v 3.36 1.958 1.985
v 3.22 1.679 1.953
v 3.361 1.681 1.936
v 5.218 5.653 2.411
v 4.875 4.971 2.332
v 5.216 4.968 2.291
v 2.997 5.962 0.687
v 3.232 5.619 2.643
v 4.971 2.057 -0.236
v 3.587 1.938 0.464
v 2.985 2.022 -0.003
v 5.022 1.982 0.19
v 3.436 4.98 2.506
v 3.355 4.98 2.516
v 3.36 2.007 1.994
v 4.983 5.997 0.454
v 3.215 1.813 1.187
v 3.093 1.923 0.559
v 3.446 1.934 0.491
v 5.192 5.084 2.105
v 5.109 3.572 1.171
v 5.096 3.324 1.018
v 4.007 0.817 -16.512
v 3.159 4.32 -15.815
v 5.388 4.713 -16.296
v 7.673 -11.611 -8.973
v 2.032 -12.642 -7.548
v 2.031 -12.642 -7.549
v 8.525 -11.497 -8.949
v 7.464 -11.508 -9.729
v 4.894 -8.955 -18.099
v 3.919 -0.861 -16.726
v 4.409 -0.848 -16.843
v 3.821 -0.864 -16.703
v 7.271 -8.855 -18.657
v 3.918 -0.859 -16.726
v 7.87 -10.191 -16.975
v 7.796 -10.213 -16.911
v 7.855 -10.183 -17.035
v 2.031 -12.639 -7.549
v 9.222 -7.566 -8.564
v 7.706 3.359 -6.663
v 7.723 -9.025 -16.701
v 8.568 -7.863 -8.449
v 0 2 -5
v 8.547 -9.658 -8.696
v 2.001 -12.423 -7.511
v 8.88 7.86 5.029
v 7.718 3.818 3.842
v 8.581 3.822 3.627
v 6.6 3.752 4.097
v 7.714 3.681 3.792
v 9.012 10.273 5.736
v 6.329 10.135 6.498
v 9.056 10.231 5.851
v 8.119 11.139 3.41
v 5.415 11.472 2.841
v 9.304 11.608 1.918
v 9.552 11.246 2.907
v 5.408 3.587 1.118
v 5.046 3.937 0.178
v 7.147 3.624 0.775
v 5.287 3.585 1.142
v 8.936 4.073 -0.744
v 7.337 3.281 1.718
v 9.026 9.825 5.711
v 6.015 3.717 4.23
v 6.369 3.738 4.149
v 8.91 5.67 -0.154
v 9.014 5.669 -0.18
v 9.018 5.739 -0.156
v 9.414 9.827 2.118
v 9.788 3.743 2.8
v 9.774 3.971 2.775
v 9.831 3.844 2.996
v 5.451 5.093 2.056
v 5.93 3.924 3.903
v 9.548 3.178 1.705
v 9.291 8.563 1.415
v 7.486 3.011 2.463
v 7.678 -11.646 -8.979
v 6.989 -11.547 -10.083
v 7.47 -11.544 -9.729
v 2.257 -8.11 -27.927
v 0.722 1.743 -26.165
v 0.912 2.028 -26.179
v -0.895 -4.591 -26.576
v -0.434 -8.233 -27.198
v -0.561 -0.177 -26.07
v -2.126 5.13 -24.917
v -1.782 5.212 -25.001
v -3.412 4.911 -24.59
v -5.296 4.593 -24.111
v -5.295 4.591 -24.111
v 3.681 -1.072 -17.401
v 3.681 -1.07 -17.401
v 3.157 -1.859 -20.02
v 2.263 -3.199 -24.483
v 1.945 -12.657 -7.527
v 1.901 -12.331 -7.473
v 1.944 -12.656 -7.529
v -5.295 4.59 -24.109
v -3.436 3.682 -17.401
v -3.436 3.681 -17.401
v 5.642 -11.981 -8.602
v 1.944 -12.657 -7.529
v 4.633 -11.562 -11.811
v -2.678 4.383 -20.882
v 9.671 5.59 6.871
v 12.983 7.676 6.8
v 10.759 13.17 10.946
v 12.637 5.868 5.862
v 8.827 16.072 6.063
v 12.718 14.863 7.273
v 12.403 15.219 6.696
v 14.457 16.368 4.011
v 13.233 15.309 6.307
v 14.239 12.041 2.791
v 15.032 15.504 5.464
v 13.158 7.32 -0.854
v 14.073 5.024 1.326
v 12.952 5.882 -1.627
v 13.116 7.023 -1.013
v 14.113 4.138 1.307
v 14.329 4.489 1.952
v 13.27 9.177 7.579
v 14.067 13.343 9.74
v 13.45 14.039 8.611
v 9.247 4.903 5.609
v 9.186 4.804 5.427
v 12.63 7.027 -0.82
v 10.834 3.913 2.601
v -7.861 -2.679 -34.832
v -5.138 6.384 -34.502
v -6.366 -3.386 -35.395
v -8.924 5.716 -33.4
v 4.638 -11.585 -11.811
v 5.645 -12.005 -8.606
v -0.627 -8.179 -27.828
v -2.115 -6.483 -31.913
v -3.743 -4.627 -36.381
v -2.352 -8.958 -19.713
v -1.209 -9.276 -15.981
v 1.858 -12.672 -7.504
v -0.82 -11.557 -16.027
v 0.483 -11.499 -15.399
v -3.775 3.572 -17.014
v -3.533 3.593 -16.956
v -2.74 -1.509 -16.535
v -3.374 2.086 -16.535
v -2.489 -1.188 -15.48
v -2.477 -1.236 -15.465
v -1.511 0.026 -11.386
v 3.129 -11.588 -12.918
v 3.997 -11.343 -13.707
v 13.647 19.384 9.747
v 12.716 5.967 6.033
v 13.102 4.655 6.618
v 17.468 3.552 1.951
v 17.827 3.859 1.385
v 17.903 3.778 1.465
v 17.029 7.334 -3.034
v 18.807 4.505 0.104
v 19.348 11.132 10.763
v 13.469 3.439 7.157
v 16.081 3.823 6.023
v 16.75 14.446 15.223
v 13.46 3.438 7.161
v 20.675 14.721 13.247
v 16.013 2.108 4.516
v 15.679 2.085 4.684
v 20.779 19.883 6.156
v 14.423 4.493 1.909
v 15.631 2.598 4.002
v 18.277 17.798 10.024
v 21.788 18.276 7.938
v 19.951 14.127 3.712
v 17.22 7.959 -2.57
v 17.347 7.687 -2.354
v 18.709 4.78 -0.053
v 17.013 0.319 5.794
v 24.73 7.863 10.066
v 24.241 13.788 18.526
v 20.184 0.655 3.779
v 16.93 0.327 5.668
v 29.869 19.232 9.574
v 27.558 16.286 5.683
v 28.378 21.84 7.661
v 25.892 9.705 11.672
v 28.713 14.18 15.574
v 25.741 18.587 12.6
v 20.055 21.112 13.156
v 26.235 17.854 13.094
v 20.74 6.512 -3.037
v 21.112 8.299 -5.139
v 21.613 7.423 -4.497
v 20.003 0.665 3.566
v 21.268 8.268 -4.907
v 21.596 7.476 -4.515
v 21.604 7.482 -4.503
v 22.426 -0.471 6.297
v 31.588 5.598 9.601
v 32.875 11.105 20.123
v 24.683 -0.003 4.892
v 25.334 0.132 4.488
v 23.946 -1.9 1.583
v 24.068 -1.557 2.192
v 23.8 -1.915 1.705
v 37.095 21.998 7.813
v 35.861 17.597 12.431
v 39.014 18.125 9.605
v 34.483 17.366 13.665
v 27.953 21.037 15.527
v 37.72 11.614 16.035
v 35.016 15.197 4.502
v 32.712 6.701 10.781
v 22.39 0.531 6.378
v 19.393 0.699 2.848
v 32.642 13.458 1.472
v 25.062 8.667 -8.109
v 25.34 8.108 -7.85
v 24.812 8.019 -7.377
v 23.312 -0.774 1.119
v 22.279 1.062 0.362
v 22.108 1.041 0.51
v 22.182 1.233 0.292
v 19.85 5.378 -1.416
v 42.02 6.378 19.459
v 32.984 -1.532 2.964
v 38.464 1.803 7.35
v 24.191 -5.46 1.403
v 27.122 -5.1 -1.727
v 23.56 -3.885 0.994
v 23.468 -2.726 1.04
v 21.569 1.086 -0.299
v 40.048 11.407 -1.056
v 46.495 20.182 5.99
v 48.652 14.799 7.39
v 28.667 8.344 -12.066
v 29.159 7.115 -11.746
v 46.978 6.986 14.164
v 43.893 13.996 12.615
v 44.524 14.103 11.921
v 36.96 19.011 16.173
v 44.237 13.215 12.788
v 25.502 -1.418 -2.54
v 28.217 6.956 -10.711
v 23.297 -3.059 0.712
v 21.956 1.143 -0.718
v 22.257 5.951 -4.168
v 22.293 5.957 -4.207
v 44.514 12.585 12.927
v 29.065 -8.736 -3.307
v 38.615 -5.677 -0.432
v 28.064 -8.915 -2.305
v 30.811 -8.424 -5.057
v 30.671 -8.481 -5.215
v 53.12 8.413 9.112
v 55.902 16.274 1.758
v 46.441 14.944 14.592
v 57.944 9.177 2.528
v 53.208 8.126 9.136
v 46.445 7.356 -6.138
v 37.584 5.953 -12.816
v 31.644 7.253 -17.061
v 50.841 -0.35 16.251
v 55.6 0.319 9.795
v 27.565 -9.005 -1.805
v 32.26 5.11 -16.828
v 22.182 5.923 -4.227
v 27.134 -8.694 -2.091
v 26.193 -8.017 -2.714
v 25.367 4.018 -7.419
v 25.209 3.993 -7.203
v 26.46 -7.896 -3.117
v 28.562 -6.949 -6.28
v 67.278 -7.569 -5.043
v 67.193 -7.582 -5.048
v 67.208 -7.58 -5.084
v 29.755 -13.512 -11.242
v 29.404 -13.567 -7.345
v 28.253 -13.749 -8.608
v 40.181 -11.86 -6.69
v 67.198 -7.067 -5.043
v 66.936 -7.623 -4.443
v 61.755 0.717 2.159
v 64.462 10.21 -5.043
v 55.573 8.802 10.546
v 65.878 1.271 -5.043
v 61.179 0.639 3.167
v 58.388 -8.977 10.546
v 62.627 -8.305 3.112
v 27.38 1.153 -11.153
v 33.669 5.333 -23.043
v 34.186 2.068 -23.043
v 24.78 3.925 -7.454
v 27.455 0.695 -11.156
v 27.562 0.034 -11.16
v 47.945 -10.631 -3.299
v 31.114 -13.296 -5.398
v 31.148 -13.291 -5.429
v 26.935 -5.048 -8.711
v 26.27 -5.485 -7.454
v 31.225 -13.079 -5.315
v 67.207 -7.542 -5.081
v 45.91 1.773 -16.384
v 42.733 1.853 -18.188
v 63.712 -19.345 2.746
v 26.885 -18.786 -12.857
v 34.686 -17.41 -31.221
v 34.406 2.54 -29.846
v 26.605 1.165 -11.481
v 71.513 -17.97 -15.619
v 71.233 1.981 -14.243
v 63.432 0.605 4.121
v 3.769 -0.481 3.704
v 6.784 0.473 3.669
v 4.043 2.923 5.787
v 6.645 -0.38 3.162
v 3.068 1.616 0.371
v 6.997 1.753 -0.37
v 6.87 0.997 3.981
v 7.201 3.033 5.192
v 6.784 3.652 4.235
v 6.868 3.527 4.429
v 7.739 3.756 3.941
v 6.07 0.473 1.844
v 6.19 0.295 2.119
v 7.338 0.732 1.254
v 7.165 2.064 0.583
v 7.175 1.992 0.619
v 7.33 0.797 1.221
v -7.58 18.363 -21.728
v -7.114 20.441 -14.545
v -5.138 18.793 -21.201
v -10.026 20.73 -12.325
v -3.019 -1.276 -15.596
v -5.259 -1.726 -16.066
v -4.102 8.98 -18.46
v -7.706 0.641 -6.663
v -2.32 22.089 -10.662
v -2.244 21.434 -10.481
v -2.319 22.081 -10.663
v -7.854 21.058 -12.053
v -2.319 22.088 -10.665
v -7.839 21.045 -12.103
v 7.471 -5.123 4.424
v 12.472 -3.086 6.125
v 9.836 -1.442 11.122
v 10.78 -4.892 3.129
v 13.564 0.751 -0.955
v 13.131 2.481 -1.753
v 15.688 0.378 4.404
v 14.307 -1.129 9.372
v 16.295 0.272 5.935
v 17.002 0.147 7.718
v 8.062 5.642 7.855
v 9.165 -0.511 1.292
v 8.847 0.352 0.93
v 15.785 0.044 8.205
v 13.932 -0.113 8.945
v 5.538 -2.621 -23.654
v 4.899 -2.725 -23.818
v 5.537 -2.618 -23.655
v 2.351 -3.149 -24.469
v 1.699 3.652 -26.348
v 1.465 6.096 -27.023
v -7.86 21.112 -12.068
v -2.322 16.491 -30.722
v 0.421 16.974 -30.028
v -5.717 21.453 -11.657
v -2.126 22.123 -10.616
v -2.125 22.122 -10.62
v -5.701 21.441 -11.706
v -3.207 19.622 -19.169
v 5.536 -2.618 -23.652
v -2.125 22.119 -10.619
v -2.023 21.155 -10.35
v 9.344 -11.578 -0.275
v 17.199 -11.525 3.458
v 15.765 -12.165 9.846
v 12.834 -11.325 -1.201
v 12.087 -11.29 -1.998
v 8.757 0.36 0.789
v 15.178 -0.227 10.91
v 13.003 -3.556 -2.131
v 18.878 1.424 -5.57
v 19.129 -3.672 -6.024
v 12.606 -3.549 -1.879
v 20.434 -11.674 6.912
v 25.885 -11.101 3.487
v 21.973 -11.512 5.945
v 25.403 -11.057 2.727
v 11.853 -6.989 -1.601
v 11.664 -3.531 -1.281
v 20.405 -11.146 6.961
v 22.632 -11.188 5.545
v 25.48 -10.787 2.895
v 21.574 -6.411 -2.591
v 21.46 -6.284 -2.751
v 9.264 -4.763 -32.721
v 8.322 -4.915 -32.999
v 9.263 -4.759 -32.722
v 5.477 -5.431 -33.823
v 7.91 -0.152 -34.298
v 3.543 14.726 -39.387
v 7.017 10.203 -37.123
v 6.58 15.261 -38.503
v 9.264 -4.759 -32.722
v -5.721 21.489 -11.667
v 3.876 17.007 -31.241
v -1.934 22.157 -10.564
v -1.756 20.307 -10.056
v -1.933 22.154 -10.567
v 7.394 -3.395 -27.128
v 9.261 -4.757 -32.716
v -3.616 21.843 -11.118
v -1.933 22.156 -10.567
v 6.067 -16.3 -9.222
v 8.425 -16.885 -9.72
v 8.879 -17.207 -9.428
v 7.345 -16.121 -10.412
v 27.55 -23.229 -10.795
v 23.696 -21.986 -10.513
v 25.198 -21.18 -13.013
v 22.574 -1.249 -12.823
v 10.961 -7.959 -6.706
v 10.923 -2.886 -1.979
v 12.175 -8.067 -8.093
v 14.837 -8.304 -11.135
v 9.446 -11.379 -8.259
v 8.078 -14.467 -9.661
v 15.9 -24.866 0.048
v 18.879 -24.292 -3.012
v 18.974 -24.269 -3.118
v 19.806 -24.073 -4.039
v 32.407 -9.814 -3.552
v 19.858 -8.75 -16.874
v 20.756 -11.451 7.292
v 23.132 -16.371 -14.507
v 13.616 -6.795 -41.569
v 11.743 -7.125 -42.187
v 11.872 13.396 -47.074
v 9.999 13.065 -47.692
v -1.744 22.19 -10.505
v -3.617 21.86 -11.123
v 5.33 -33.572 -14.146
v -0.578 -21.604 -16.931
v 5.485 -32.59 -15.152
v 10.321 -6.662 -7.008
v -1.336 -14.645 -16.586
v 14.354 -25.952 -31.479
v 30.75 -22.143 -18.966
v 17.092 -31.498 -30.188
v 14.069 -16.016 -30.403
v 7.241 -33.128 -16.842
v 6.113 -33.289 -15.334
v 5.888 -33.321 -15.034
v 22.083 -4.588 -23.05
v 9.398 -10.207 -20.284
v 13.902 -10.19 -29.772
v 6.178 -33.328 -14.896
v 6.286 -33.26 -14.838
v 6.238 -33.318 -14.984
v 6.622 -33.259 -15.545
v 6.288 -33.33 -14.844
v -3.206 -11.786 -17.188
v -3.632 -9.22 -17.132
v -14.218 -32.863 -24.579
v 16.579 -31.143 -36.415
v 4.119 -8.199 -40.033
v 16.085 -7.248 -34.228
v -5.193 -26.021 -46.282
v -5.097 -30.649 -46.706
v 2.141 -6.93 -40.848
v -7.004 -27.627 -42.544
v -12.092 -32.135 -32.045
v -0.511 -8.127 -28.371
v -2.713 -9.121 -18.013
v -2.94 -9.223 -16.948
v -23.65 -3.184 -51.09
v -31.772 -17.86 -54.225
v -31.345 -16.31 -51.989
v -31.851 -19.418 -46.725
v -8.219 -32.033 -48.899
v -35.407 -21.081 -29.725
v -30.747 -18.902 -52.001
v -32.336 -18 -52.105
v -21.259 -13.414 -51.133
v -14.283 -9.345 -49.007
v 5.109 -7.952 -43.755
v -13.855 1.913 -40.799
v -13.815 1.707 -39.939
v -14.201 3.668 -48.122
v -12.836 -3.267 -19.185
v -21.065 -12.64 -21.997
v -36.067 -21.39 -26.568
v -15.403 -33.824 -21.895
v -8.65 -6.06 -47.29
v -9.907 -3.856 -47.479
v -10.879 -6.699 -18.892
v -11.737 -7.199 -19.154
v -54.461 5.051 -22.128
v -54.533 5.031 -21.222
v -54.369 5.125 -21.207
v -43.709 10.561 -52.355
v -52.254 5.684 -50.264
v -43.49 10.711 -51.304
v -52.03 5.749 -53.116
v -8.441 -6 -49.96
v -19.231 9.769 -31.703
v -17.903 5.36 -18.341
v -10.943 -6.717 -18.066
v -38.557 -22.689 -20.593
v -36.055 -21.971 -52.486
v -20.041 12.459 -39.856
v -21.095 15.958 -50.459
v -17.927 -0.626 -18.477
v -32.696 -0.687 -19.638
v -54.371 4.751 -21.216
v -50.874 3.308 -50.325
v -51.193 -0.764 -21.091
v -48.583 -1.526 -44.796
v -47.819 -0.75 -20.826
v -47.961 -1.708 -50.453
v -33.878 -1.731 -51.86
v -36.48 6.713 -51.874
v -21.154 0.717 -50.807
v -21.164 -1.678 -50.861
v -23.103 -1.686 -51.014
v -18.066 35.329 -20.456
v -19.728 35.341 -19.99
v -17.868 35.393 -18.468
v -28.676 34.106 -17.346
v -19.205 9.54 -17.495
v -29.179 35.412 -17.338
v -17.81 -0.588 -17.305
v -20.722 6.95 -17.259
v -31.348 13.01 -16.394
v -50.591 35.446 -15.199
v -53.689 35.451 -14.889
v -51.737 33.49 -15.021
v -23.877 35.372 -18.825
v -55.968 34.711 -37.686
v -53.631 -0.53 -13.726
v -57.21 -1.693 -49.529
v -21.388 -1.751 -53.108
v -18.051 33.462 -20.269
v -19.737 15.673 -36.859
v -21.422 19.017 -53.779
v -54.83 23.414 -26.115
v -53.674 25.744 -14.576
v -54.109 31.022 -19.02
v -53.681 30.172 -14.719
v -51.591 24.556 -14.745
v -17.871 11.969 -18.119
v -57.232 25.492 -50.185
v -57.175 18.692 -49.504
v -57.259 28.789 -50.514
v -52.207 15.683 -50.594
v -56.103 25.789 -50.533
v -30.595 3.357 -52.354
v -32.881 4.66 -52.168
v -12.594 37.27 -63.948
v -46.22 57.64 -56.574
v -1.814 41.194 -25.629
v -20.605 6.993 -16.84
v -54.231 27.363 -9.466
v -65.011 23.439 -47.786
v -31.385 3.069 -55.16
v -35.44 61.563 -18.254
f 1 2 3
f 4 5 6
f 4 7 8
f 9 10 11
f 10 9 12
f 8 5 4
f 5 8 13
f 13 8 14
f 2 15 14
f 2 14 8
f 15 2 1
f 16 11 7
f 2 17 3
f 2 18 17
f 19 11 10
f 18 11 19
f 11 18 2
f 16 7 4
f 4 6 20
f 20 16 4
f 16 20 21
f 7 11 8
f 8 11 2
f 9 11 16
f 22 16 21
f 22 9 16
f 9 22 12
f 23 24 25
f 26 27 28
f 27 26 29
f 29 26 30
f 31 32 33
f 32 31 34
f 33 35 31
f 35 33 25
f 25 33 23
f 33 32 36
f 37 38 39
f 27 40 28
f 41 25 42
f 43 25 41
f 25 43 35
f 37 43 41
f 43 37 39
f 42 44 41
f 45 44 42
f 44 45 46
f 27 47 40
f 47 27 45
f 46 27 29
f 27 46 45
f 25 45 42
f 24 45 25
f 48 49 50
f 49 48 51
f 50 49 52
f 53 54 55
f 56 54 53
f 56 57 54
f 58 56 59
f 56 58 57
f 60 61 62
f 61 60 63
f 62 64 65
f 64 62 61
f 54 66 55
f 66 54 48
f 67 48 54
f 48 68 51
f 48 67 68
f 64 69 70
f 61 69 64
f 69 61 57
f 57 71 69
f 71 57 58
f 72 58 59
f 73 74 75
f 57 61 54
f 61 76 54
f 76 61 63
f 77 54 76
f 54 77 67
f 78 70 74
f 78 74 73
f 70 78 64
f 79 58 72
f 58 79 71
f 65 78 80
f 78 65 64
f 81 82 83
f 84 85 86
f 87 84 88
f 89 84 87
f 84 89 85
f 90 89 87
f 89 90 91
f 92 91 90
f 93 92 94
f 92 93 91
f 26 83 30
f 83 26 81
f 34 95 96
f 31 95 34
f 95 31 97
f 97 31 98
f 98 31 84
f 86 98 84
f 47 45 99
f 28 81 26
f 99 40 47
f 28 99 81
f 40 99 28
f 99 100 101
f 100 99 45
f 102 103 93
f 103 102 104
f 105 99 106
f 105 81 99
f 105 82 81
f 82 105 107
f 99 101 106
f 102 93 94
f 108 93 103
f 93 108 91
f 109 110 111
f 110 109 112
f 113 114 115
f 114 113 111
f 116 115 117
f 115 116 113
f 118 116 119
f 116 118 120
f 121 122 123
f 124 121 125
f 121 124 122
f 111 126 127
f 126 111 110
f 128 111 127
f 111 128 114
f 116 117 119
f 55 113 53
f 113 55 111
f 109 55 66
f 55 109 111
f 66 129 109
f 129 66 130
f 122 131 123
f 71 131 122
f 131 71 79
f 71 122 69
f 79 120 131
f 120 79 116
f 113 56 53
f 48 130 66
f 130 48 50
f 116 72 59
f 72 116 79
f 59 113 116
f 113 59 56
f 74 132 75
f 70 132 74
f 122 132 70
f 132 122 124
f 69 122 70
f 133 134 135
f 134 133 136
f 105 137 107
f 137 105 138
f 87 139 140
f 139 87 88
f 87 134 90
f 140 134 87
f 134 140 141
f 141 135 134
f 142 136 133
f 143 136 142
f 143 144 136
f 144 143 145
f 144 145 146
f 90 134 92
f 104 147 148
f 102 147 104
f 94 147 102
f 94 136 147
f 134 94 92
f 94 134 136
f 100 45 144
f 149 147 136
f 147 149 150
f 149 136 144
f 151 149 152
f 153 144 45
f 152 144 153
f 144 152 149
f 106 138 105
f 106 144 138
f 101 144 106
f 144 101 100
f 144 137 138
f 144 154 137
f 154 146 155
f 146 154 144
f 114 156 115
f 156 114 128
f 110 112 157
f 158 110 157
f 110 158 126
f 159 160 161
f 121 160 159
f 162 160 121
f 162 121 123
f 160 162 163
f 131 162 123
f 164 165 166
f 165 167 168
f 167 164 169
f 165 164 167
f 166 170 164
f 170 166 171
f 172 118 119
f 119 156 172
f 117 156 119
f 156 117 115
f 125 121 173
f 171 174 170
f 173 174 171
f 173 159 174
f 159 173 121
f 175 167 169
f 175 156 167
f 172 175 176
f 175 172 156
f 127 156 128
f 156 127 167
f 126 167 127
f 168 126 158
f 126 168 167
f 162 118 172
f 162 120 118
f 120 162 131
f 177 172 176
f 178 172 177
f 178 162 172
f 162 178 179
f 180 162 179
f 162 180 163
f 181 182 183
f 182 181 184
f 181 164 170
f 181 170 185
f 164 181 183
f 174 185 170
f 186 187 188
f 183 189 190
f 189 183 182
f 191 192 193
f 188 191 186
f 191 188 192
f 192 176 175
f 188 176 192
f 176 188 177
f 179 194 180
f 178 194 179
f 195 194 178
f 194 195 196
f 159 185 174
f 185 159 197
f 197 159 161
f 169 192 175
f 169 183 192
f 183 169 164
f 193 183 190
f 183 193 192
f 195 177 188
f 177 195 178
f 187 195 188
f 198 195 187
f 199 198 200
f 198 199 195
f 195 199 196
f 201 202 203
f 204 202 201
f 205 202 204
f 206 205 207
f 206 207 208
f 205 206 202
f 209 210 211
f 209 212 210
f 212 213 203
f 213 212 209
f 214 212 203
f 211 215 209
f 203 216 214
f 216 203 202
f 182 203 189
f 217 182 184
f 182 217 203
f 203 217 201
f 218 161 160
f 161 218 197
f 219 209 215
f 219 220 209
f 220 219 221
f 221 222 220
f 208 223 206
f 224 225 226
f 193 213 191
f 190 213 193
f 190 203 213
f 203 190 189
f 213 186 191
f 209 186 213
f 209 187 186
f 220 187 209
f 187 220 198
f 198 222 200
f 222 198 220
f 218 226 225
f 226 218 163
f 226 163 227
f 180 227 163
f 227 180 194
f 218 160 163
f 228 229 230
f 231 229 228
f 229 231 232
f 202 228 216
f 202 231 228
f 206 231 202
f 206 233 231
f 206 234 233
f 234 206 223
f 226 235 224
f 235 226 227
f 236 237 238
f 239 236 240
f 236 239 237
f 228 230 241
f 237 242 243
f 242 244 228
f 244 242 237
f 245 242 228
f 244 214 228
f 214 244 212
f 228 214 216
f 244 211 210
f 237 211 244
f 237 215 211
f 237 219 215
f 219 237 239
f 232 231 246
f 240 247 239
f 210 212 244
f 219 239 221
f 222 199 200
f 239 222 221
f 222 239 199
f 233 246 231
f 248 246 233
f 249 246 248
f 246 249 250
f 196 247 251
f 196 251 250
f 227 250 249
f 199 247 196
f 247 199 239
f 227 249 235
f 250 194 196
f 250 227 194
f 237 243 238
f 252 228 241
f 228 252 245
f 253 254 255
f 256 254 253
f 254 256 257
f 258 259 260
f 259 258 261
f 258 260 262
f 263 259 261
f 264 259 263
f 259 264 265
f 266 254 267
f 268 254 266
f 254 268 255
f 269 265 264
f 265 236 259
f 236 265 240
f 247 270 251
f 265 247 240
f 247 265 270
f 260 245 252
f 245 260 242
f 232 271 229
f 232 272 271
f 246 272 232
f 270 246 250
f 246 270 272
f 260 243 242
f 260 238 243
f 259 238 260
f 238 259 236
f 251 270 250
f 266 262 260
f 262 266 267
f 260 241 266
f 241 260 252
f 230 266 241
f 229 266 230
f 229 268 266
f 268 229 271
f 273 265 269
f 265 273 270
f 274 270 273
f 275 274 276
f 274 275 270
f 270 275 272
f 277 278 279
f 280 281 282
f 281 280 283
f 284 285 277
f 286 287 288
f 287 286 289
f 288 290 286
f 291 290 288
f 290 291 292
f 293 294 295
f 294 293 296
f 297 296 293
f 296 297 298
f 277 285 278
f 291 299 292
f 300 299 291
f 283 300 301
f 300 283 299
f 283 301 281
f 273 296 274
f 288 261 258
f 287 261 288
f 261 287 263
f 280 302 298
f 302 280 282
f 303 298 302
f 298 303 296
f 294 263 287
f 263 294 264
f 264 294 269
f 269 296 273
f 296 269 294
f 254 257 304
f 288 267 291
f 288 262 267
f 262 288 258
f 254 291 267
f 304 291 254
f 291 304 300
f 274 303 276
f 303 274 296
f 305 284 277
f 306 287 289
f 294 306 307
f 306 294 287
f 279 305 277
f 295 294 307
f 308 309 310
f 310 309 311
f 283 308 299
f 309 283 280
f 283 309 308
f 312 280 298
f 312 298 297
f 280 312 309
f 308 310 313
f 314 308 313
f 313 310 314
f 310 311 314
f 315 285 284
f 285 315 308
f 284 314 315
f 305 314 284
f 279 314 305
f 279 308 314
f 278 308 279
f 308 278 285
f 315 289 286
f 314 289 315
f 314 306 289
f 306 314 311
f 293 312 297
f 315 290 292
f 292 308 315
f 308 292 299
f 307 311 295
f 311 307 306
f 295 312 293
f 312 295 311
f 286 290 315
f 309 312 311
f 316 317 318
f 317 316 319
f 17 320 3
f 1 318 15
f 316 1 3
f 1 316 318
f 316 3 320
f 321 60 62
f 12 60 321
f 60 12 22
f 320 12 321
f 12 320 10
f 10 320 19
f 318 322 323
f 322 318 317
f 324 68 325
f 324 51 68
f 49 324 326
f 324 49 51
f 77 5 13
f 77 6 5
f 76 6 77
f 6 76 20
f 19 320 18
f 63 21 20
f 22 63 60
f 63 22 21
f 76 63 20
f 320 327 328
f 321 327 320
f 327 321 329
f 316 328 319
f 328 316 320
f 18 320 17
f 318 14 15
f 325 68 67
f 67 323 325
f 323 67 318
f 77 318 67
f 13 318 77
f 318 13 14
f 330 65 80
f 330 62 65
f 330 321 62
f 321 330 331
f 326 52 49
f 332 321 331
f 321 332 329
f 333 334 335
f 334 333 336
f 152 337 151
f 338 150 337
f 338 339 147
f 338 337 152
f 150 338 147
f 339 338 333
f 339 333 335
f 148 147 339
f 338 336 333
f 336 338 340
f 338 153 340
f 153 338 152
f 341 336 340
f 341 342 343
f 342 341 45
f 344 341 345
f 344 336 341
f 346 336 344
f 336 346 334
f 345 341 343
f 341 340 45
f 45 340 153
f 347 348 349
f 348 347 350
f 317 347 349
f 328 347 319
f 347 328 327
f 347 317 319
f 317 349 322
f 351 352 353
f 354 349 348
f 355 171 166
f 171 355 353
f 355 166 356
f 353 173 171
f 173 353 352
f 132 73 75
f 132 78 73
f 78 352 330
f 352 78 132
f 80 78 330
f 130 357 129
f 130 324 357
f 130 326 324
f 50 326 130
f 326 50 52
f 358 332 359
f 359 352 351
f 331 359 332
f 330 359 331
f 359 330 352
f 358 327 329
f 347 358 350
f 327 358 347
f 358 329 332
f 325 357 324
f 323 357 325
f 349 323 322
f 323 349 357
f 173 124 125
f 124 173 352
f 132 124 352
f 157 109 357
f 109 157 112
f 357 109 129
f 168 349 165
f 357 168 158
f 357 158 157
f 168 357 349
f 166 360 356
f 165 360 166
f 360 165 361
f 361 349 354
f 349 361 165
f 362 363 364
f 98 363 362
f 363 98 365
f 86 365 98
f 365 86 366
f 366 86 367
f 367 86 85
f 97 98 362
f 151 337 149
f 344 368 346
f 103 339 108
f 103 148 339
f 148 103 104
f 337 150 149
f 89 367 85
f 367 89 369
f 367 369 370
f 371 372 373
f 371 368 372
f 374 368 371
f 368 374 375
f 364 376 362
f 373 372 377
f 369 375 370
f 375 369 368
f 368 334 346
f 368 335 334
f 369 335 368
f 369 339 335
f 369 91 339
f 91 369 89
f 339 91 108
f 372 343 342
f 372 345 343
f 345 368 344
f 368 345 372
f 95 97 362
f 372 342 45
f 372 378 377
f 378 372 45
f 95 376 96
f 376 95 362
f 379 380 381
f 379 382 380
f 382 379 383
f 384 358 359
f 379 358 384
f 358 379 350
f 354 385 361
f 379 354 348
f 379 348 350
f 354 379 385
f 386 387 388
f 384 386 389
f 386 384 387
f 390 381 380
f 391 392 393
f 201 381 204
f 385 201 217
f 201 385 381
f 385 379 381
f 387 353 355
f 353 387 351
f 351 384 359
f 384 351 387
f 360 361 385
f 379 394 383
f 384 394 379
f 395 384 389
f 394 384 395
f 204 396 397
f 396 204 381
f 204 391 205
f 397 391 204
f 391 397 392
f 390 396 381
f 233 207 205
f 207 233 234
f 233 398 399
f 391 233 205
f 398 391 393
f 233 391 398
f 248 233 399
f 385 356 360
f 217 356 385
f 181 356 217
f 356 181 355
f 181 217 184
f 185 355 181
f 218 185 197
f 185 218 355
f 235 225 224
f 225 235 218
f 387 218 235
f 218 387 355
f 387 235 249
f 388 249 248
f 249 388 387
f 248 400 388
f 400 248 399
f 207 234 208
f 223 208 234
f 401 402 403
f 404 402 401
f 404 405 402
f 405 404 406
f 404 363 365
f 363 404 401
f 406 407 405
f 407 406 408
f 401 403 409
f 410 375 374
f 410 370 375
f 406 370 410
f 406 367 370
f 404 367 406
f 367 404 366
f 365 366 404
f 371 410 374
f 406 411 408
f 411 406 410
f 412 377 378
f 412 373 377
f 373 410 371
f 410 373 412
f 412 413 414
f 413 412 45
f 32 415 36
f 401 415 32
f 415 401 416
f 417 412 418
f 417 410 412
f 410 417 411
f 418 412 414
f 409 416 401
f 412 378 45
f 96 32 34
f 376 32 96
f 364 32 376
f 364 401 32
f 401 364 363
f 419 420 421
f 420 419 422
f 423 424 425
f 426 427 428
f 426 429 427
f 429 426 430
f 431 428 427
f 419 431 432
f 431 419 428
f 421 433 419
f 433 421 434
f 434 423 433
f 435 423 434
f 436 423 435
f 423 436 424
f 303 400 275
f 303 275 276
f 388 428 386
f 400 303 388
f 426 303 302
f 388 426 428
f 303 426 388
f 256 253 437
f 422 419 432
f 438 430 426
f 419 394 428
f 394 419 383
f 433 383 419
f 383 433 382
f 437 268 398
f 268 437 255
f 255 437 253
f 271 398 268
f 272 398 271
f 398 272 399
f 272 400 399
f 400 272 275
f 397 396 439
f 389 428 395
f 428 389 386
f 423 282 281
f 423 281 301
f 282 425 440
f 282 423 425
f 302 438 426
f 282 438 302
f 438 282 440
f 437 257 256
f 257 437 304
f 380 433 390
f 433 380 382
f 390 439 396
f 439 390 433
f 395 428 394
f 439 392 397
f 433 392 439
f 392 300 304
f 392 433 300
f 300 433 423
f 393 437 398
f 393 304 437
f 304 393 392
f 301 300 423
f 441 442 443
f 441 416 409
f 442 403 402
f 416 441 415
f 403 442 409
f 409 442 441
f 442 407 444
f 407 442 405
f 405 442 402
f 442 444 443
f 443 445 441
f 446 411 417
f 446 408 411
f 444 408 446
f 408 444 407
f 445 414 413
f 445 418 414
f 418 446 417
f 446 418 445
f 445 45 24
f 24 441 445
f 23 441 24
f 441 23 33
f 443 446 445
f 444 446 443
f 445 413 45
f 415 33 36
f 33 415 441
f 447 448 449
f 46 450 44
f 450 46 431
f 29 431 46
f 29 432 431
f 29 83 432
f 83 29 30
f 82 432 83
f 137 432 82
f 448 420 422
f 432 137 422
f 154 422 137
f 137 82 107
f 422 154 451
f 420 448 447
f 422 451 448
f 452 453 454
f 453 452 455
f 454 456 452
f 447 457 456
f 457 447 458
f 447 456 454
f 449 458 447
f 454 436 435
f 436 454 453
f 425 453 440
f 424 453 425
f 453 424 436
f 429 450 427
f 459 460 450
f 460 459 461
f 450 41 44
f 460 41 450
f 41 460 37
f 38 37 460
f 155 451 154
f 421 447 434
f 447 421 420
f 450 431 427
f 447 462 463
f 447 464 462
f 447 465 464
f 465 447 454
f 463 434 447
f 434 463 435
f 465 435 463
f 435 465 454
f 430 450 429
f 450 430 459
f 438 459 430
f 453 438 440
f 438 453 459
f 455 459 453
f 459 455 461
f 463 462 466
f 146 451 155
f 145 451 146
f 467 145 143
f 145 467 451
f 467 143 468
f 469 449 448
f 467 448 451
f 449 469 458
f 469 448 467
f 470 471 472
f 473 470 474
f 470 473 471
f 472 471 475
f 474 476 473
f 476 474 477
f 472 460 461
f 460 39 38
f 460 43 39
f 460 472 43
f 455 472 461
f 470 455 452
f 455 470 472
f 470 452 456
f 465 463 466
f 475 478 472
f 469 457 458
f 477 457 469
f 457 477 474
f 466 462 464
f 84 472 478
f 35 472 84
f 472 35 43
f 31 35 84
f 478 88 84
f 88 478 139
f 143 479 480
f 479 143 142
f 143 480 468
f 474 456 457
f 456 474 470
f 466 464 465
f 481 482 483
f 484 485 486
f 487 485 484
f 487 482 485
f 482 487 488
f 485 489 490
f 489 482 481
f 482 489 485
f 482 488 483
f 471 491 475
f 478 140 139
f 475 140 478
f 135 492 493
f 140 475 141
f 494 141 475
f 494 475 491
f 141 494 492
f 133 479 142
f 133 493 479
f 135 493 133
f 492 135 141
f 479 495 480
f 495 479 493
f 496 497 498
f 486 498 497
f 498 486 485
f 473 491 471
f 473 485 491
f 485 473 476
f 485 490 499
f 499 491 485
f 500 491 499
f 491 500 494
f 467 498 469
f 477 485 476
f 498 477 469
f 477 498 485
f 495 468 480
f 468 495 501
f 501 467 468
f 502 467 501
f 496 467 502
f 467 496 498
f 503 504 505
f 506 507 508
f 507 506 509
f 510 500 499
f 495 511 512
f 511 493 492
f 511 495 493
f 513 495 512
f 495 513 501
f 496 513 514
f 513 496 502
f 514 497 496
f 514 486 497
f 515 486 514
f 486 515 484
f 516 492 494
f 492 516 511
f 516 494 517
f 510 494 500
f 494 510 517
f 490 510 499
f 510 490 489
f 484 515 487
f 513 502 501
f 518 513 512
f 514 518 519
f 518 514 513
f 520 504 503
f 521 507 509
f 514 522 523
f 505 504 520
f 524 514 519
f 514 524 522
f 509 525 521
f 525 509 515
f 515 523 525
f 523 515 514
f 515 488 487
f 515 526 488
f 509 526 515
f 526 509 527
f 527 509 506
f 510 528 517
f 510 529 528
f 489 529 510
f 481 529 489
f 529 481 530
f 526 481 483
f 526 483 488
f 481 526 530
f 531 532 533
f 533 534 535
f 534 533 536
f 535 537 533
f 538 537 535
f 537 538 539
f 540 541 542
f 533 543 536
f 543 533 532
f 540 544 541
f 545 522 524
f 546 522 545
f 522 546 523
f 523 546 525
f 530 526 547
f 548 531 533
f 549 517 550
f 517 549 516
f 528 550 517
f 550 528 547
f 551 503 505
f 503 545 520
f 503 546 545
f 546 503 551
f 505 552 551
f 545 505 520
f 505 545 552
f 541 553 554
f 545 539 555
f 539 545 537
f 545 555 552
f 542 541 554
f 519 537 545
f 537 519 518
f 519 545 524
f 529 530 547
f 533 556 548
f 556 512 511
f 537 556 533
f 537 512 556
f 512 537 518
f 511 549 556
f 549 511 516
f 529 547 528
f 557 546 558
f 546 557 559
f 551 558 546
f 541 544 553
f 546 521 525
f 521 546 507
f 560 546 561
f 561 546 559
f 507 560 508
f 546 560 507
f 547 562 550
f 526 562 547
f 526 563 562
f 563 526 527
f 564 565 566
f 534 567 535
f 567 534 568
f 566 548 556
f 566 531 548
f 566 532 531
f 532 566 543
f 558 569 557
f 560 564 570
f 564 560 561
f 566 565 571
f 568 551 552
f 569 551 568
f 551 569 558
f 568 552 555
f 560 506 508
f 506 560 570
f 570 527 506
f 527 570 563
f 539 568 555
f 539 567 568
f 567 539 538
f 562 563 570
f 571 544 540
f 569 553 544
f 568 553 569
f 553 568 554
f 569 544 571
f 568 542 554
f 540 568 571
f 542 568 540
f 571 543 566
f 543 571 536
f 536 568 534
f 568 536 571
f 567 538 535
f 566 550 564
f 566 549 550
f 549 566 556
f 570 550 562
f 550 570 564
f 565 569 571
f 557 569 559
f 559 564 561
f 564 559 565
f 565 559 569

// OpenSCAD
for (y = [10 : 6 : 20]) {
  for (x = [0 : 2 : 20]) {
    if ( y % 4 != 0) {
      rotate([x*y/2,y*x/3,x/2])
        translate([x+1,y*x/10,0])
        cube([x,x + (x*y*0.1),x]);
    } else {
      rotate([x*y,y*x/3,x])
        translate([x+1,y*x/18,0])
        cube([x*2,x*2,x*2]);
    }
    union() {
      if (2/x*y*y/30 > 1) {
        translate([0,2,-5])
          rotate([y,70-(x)+100,90*y+10])
          cube([10-x,5+y,x*5]);
      }
    }
  }
}
